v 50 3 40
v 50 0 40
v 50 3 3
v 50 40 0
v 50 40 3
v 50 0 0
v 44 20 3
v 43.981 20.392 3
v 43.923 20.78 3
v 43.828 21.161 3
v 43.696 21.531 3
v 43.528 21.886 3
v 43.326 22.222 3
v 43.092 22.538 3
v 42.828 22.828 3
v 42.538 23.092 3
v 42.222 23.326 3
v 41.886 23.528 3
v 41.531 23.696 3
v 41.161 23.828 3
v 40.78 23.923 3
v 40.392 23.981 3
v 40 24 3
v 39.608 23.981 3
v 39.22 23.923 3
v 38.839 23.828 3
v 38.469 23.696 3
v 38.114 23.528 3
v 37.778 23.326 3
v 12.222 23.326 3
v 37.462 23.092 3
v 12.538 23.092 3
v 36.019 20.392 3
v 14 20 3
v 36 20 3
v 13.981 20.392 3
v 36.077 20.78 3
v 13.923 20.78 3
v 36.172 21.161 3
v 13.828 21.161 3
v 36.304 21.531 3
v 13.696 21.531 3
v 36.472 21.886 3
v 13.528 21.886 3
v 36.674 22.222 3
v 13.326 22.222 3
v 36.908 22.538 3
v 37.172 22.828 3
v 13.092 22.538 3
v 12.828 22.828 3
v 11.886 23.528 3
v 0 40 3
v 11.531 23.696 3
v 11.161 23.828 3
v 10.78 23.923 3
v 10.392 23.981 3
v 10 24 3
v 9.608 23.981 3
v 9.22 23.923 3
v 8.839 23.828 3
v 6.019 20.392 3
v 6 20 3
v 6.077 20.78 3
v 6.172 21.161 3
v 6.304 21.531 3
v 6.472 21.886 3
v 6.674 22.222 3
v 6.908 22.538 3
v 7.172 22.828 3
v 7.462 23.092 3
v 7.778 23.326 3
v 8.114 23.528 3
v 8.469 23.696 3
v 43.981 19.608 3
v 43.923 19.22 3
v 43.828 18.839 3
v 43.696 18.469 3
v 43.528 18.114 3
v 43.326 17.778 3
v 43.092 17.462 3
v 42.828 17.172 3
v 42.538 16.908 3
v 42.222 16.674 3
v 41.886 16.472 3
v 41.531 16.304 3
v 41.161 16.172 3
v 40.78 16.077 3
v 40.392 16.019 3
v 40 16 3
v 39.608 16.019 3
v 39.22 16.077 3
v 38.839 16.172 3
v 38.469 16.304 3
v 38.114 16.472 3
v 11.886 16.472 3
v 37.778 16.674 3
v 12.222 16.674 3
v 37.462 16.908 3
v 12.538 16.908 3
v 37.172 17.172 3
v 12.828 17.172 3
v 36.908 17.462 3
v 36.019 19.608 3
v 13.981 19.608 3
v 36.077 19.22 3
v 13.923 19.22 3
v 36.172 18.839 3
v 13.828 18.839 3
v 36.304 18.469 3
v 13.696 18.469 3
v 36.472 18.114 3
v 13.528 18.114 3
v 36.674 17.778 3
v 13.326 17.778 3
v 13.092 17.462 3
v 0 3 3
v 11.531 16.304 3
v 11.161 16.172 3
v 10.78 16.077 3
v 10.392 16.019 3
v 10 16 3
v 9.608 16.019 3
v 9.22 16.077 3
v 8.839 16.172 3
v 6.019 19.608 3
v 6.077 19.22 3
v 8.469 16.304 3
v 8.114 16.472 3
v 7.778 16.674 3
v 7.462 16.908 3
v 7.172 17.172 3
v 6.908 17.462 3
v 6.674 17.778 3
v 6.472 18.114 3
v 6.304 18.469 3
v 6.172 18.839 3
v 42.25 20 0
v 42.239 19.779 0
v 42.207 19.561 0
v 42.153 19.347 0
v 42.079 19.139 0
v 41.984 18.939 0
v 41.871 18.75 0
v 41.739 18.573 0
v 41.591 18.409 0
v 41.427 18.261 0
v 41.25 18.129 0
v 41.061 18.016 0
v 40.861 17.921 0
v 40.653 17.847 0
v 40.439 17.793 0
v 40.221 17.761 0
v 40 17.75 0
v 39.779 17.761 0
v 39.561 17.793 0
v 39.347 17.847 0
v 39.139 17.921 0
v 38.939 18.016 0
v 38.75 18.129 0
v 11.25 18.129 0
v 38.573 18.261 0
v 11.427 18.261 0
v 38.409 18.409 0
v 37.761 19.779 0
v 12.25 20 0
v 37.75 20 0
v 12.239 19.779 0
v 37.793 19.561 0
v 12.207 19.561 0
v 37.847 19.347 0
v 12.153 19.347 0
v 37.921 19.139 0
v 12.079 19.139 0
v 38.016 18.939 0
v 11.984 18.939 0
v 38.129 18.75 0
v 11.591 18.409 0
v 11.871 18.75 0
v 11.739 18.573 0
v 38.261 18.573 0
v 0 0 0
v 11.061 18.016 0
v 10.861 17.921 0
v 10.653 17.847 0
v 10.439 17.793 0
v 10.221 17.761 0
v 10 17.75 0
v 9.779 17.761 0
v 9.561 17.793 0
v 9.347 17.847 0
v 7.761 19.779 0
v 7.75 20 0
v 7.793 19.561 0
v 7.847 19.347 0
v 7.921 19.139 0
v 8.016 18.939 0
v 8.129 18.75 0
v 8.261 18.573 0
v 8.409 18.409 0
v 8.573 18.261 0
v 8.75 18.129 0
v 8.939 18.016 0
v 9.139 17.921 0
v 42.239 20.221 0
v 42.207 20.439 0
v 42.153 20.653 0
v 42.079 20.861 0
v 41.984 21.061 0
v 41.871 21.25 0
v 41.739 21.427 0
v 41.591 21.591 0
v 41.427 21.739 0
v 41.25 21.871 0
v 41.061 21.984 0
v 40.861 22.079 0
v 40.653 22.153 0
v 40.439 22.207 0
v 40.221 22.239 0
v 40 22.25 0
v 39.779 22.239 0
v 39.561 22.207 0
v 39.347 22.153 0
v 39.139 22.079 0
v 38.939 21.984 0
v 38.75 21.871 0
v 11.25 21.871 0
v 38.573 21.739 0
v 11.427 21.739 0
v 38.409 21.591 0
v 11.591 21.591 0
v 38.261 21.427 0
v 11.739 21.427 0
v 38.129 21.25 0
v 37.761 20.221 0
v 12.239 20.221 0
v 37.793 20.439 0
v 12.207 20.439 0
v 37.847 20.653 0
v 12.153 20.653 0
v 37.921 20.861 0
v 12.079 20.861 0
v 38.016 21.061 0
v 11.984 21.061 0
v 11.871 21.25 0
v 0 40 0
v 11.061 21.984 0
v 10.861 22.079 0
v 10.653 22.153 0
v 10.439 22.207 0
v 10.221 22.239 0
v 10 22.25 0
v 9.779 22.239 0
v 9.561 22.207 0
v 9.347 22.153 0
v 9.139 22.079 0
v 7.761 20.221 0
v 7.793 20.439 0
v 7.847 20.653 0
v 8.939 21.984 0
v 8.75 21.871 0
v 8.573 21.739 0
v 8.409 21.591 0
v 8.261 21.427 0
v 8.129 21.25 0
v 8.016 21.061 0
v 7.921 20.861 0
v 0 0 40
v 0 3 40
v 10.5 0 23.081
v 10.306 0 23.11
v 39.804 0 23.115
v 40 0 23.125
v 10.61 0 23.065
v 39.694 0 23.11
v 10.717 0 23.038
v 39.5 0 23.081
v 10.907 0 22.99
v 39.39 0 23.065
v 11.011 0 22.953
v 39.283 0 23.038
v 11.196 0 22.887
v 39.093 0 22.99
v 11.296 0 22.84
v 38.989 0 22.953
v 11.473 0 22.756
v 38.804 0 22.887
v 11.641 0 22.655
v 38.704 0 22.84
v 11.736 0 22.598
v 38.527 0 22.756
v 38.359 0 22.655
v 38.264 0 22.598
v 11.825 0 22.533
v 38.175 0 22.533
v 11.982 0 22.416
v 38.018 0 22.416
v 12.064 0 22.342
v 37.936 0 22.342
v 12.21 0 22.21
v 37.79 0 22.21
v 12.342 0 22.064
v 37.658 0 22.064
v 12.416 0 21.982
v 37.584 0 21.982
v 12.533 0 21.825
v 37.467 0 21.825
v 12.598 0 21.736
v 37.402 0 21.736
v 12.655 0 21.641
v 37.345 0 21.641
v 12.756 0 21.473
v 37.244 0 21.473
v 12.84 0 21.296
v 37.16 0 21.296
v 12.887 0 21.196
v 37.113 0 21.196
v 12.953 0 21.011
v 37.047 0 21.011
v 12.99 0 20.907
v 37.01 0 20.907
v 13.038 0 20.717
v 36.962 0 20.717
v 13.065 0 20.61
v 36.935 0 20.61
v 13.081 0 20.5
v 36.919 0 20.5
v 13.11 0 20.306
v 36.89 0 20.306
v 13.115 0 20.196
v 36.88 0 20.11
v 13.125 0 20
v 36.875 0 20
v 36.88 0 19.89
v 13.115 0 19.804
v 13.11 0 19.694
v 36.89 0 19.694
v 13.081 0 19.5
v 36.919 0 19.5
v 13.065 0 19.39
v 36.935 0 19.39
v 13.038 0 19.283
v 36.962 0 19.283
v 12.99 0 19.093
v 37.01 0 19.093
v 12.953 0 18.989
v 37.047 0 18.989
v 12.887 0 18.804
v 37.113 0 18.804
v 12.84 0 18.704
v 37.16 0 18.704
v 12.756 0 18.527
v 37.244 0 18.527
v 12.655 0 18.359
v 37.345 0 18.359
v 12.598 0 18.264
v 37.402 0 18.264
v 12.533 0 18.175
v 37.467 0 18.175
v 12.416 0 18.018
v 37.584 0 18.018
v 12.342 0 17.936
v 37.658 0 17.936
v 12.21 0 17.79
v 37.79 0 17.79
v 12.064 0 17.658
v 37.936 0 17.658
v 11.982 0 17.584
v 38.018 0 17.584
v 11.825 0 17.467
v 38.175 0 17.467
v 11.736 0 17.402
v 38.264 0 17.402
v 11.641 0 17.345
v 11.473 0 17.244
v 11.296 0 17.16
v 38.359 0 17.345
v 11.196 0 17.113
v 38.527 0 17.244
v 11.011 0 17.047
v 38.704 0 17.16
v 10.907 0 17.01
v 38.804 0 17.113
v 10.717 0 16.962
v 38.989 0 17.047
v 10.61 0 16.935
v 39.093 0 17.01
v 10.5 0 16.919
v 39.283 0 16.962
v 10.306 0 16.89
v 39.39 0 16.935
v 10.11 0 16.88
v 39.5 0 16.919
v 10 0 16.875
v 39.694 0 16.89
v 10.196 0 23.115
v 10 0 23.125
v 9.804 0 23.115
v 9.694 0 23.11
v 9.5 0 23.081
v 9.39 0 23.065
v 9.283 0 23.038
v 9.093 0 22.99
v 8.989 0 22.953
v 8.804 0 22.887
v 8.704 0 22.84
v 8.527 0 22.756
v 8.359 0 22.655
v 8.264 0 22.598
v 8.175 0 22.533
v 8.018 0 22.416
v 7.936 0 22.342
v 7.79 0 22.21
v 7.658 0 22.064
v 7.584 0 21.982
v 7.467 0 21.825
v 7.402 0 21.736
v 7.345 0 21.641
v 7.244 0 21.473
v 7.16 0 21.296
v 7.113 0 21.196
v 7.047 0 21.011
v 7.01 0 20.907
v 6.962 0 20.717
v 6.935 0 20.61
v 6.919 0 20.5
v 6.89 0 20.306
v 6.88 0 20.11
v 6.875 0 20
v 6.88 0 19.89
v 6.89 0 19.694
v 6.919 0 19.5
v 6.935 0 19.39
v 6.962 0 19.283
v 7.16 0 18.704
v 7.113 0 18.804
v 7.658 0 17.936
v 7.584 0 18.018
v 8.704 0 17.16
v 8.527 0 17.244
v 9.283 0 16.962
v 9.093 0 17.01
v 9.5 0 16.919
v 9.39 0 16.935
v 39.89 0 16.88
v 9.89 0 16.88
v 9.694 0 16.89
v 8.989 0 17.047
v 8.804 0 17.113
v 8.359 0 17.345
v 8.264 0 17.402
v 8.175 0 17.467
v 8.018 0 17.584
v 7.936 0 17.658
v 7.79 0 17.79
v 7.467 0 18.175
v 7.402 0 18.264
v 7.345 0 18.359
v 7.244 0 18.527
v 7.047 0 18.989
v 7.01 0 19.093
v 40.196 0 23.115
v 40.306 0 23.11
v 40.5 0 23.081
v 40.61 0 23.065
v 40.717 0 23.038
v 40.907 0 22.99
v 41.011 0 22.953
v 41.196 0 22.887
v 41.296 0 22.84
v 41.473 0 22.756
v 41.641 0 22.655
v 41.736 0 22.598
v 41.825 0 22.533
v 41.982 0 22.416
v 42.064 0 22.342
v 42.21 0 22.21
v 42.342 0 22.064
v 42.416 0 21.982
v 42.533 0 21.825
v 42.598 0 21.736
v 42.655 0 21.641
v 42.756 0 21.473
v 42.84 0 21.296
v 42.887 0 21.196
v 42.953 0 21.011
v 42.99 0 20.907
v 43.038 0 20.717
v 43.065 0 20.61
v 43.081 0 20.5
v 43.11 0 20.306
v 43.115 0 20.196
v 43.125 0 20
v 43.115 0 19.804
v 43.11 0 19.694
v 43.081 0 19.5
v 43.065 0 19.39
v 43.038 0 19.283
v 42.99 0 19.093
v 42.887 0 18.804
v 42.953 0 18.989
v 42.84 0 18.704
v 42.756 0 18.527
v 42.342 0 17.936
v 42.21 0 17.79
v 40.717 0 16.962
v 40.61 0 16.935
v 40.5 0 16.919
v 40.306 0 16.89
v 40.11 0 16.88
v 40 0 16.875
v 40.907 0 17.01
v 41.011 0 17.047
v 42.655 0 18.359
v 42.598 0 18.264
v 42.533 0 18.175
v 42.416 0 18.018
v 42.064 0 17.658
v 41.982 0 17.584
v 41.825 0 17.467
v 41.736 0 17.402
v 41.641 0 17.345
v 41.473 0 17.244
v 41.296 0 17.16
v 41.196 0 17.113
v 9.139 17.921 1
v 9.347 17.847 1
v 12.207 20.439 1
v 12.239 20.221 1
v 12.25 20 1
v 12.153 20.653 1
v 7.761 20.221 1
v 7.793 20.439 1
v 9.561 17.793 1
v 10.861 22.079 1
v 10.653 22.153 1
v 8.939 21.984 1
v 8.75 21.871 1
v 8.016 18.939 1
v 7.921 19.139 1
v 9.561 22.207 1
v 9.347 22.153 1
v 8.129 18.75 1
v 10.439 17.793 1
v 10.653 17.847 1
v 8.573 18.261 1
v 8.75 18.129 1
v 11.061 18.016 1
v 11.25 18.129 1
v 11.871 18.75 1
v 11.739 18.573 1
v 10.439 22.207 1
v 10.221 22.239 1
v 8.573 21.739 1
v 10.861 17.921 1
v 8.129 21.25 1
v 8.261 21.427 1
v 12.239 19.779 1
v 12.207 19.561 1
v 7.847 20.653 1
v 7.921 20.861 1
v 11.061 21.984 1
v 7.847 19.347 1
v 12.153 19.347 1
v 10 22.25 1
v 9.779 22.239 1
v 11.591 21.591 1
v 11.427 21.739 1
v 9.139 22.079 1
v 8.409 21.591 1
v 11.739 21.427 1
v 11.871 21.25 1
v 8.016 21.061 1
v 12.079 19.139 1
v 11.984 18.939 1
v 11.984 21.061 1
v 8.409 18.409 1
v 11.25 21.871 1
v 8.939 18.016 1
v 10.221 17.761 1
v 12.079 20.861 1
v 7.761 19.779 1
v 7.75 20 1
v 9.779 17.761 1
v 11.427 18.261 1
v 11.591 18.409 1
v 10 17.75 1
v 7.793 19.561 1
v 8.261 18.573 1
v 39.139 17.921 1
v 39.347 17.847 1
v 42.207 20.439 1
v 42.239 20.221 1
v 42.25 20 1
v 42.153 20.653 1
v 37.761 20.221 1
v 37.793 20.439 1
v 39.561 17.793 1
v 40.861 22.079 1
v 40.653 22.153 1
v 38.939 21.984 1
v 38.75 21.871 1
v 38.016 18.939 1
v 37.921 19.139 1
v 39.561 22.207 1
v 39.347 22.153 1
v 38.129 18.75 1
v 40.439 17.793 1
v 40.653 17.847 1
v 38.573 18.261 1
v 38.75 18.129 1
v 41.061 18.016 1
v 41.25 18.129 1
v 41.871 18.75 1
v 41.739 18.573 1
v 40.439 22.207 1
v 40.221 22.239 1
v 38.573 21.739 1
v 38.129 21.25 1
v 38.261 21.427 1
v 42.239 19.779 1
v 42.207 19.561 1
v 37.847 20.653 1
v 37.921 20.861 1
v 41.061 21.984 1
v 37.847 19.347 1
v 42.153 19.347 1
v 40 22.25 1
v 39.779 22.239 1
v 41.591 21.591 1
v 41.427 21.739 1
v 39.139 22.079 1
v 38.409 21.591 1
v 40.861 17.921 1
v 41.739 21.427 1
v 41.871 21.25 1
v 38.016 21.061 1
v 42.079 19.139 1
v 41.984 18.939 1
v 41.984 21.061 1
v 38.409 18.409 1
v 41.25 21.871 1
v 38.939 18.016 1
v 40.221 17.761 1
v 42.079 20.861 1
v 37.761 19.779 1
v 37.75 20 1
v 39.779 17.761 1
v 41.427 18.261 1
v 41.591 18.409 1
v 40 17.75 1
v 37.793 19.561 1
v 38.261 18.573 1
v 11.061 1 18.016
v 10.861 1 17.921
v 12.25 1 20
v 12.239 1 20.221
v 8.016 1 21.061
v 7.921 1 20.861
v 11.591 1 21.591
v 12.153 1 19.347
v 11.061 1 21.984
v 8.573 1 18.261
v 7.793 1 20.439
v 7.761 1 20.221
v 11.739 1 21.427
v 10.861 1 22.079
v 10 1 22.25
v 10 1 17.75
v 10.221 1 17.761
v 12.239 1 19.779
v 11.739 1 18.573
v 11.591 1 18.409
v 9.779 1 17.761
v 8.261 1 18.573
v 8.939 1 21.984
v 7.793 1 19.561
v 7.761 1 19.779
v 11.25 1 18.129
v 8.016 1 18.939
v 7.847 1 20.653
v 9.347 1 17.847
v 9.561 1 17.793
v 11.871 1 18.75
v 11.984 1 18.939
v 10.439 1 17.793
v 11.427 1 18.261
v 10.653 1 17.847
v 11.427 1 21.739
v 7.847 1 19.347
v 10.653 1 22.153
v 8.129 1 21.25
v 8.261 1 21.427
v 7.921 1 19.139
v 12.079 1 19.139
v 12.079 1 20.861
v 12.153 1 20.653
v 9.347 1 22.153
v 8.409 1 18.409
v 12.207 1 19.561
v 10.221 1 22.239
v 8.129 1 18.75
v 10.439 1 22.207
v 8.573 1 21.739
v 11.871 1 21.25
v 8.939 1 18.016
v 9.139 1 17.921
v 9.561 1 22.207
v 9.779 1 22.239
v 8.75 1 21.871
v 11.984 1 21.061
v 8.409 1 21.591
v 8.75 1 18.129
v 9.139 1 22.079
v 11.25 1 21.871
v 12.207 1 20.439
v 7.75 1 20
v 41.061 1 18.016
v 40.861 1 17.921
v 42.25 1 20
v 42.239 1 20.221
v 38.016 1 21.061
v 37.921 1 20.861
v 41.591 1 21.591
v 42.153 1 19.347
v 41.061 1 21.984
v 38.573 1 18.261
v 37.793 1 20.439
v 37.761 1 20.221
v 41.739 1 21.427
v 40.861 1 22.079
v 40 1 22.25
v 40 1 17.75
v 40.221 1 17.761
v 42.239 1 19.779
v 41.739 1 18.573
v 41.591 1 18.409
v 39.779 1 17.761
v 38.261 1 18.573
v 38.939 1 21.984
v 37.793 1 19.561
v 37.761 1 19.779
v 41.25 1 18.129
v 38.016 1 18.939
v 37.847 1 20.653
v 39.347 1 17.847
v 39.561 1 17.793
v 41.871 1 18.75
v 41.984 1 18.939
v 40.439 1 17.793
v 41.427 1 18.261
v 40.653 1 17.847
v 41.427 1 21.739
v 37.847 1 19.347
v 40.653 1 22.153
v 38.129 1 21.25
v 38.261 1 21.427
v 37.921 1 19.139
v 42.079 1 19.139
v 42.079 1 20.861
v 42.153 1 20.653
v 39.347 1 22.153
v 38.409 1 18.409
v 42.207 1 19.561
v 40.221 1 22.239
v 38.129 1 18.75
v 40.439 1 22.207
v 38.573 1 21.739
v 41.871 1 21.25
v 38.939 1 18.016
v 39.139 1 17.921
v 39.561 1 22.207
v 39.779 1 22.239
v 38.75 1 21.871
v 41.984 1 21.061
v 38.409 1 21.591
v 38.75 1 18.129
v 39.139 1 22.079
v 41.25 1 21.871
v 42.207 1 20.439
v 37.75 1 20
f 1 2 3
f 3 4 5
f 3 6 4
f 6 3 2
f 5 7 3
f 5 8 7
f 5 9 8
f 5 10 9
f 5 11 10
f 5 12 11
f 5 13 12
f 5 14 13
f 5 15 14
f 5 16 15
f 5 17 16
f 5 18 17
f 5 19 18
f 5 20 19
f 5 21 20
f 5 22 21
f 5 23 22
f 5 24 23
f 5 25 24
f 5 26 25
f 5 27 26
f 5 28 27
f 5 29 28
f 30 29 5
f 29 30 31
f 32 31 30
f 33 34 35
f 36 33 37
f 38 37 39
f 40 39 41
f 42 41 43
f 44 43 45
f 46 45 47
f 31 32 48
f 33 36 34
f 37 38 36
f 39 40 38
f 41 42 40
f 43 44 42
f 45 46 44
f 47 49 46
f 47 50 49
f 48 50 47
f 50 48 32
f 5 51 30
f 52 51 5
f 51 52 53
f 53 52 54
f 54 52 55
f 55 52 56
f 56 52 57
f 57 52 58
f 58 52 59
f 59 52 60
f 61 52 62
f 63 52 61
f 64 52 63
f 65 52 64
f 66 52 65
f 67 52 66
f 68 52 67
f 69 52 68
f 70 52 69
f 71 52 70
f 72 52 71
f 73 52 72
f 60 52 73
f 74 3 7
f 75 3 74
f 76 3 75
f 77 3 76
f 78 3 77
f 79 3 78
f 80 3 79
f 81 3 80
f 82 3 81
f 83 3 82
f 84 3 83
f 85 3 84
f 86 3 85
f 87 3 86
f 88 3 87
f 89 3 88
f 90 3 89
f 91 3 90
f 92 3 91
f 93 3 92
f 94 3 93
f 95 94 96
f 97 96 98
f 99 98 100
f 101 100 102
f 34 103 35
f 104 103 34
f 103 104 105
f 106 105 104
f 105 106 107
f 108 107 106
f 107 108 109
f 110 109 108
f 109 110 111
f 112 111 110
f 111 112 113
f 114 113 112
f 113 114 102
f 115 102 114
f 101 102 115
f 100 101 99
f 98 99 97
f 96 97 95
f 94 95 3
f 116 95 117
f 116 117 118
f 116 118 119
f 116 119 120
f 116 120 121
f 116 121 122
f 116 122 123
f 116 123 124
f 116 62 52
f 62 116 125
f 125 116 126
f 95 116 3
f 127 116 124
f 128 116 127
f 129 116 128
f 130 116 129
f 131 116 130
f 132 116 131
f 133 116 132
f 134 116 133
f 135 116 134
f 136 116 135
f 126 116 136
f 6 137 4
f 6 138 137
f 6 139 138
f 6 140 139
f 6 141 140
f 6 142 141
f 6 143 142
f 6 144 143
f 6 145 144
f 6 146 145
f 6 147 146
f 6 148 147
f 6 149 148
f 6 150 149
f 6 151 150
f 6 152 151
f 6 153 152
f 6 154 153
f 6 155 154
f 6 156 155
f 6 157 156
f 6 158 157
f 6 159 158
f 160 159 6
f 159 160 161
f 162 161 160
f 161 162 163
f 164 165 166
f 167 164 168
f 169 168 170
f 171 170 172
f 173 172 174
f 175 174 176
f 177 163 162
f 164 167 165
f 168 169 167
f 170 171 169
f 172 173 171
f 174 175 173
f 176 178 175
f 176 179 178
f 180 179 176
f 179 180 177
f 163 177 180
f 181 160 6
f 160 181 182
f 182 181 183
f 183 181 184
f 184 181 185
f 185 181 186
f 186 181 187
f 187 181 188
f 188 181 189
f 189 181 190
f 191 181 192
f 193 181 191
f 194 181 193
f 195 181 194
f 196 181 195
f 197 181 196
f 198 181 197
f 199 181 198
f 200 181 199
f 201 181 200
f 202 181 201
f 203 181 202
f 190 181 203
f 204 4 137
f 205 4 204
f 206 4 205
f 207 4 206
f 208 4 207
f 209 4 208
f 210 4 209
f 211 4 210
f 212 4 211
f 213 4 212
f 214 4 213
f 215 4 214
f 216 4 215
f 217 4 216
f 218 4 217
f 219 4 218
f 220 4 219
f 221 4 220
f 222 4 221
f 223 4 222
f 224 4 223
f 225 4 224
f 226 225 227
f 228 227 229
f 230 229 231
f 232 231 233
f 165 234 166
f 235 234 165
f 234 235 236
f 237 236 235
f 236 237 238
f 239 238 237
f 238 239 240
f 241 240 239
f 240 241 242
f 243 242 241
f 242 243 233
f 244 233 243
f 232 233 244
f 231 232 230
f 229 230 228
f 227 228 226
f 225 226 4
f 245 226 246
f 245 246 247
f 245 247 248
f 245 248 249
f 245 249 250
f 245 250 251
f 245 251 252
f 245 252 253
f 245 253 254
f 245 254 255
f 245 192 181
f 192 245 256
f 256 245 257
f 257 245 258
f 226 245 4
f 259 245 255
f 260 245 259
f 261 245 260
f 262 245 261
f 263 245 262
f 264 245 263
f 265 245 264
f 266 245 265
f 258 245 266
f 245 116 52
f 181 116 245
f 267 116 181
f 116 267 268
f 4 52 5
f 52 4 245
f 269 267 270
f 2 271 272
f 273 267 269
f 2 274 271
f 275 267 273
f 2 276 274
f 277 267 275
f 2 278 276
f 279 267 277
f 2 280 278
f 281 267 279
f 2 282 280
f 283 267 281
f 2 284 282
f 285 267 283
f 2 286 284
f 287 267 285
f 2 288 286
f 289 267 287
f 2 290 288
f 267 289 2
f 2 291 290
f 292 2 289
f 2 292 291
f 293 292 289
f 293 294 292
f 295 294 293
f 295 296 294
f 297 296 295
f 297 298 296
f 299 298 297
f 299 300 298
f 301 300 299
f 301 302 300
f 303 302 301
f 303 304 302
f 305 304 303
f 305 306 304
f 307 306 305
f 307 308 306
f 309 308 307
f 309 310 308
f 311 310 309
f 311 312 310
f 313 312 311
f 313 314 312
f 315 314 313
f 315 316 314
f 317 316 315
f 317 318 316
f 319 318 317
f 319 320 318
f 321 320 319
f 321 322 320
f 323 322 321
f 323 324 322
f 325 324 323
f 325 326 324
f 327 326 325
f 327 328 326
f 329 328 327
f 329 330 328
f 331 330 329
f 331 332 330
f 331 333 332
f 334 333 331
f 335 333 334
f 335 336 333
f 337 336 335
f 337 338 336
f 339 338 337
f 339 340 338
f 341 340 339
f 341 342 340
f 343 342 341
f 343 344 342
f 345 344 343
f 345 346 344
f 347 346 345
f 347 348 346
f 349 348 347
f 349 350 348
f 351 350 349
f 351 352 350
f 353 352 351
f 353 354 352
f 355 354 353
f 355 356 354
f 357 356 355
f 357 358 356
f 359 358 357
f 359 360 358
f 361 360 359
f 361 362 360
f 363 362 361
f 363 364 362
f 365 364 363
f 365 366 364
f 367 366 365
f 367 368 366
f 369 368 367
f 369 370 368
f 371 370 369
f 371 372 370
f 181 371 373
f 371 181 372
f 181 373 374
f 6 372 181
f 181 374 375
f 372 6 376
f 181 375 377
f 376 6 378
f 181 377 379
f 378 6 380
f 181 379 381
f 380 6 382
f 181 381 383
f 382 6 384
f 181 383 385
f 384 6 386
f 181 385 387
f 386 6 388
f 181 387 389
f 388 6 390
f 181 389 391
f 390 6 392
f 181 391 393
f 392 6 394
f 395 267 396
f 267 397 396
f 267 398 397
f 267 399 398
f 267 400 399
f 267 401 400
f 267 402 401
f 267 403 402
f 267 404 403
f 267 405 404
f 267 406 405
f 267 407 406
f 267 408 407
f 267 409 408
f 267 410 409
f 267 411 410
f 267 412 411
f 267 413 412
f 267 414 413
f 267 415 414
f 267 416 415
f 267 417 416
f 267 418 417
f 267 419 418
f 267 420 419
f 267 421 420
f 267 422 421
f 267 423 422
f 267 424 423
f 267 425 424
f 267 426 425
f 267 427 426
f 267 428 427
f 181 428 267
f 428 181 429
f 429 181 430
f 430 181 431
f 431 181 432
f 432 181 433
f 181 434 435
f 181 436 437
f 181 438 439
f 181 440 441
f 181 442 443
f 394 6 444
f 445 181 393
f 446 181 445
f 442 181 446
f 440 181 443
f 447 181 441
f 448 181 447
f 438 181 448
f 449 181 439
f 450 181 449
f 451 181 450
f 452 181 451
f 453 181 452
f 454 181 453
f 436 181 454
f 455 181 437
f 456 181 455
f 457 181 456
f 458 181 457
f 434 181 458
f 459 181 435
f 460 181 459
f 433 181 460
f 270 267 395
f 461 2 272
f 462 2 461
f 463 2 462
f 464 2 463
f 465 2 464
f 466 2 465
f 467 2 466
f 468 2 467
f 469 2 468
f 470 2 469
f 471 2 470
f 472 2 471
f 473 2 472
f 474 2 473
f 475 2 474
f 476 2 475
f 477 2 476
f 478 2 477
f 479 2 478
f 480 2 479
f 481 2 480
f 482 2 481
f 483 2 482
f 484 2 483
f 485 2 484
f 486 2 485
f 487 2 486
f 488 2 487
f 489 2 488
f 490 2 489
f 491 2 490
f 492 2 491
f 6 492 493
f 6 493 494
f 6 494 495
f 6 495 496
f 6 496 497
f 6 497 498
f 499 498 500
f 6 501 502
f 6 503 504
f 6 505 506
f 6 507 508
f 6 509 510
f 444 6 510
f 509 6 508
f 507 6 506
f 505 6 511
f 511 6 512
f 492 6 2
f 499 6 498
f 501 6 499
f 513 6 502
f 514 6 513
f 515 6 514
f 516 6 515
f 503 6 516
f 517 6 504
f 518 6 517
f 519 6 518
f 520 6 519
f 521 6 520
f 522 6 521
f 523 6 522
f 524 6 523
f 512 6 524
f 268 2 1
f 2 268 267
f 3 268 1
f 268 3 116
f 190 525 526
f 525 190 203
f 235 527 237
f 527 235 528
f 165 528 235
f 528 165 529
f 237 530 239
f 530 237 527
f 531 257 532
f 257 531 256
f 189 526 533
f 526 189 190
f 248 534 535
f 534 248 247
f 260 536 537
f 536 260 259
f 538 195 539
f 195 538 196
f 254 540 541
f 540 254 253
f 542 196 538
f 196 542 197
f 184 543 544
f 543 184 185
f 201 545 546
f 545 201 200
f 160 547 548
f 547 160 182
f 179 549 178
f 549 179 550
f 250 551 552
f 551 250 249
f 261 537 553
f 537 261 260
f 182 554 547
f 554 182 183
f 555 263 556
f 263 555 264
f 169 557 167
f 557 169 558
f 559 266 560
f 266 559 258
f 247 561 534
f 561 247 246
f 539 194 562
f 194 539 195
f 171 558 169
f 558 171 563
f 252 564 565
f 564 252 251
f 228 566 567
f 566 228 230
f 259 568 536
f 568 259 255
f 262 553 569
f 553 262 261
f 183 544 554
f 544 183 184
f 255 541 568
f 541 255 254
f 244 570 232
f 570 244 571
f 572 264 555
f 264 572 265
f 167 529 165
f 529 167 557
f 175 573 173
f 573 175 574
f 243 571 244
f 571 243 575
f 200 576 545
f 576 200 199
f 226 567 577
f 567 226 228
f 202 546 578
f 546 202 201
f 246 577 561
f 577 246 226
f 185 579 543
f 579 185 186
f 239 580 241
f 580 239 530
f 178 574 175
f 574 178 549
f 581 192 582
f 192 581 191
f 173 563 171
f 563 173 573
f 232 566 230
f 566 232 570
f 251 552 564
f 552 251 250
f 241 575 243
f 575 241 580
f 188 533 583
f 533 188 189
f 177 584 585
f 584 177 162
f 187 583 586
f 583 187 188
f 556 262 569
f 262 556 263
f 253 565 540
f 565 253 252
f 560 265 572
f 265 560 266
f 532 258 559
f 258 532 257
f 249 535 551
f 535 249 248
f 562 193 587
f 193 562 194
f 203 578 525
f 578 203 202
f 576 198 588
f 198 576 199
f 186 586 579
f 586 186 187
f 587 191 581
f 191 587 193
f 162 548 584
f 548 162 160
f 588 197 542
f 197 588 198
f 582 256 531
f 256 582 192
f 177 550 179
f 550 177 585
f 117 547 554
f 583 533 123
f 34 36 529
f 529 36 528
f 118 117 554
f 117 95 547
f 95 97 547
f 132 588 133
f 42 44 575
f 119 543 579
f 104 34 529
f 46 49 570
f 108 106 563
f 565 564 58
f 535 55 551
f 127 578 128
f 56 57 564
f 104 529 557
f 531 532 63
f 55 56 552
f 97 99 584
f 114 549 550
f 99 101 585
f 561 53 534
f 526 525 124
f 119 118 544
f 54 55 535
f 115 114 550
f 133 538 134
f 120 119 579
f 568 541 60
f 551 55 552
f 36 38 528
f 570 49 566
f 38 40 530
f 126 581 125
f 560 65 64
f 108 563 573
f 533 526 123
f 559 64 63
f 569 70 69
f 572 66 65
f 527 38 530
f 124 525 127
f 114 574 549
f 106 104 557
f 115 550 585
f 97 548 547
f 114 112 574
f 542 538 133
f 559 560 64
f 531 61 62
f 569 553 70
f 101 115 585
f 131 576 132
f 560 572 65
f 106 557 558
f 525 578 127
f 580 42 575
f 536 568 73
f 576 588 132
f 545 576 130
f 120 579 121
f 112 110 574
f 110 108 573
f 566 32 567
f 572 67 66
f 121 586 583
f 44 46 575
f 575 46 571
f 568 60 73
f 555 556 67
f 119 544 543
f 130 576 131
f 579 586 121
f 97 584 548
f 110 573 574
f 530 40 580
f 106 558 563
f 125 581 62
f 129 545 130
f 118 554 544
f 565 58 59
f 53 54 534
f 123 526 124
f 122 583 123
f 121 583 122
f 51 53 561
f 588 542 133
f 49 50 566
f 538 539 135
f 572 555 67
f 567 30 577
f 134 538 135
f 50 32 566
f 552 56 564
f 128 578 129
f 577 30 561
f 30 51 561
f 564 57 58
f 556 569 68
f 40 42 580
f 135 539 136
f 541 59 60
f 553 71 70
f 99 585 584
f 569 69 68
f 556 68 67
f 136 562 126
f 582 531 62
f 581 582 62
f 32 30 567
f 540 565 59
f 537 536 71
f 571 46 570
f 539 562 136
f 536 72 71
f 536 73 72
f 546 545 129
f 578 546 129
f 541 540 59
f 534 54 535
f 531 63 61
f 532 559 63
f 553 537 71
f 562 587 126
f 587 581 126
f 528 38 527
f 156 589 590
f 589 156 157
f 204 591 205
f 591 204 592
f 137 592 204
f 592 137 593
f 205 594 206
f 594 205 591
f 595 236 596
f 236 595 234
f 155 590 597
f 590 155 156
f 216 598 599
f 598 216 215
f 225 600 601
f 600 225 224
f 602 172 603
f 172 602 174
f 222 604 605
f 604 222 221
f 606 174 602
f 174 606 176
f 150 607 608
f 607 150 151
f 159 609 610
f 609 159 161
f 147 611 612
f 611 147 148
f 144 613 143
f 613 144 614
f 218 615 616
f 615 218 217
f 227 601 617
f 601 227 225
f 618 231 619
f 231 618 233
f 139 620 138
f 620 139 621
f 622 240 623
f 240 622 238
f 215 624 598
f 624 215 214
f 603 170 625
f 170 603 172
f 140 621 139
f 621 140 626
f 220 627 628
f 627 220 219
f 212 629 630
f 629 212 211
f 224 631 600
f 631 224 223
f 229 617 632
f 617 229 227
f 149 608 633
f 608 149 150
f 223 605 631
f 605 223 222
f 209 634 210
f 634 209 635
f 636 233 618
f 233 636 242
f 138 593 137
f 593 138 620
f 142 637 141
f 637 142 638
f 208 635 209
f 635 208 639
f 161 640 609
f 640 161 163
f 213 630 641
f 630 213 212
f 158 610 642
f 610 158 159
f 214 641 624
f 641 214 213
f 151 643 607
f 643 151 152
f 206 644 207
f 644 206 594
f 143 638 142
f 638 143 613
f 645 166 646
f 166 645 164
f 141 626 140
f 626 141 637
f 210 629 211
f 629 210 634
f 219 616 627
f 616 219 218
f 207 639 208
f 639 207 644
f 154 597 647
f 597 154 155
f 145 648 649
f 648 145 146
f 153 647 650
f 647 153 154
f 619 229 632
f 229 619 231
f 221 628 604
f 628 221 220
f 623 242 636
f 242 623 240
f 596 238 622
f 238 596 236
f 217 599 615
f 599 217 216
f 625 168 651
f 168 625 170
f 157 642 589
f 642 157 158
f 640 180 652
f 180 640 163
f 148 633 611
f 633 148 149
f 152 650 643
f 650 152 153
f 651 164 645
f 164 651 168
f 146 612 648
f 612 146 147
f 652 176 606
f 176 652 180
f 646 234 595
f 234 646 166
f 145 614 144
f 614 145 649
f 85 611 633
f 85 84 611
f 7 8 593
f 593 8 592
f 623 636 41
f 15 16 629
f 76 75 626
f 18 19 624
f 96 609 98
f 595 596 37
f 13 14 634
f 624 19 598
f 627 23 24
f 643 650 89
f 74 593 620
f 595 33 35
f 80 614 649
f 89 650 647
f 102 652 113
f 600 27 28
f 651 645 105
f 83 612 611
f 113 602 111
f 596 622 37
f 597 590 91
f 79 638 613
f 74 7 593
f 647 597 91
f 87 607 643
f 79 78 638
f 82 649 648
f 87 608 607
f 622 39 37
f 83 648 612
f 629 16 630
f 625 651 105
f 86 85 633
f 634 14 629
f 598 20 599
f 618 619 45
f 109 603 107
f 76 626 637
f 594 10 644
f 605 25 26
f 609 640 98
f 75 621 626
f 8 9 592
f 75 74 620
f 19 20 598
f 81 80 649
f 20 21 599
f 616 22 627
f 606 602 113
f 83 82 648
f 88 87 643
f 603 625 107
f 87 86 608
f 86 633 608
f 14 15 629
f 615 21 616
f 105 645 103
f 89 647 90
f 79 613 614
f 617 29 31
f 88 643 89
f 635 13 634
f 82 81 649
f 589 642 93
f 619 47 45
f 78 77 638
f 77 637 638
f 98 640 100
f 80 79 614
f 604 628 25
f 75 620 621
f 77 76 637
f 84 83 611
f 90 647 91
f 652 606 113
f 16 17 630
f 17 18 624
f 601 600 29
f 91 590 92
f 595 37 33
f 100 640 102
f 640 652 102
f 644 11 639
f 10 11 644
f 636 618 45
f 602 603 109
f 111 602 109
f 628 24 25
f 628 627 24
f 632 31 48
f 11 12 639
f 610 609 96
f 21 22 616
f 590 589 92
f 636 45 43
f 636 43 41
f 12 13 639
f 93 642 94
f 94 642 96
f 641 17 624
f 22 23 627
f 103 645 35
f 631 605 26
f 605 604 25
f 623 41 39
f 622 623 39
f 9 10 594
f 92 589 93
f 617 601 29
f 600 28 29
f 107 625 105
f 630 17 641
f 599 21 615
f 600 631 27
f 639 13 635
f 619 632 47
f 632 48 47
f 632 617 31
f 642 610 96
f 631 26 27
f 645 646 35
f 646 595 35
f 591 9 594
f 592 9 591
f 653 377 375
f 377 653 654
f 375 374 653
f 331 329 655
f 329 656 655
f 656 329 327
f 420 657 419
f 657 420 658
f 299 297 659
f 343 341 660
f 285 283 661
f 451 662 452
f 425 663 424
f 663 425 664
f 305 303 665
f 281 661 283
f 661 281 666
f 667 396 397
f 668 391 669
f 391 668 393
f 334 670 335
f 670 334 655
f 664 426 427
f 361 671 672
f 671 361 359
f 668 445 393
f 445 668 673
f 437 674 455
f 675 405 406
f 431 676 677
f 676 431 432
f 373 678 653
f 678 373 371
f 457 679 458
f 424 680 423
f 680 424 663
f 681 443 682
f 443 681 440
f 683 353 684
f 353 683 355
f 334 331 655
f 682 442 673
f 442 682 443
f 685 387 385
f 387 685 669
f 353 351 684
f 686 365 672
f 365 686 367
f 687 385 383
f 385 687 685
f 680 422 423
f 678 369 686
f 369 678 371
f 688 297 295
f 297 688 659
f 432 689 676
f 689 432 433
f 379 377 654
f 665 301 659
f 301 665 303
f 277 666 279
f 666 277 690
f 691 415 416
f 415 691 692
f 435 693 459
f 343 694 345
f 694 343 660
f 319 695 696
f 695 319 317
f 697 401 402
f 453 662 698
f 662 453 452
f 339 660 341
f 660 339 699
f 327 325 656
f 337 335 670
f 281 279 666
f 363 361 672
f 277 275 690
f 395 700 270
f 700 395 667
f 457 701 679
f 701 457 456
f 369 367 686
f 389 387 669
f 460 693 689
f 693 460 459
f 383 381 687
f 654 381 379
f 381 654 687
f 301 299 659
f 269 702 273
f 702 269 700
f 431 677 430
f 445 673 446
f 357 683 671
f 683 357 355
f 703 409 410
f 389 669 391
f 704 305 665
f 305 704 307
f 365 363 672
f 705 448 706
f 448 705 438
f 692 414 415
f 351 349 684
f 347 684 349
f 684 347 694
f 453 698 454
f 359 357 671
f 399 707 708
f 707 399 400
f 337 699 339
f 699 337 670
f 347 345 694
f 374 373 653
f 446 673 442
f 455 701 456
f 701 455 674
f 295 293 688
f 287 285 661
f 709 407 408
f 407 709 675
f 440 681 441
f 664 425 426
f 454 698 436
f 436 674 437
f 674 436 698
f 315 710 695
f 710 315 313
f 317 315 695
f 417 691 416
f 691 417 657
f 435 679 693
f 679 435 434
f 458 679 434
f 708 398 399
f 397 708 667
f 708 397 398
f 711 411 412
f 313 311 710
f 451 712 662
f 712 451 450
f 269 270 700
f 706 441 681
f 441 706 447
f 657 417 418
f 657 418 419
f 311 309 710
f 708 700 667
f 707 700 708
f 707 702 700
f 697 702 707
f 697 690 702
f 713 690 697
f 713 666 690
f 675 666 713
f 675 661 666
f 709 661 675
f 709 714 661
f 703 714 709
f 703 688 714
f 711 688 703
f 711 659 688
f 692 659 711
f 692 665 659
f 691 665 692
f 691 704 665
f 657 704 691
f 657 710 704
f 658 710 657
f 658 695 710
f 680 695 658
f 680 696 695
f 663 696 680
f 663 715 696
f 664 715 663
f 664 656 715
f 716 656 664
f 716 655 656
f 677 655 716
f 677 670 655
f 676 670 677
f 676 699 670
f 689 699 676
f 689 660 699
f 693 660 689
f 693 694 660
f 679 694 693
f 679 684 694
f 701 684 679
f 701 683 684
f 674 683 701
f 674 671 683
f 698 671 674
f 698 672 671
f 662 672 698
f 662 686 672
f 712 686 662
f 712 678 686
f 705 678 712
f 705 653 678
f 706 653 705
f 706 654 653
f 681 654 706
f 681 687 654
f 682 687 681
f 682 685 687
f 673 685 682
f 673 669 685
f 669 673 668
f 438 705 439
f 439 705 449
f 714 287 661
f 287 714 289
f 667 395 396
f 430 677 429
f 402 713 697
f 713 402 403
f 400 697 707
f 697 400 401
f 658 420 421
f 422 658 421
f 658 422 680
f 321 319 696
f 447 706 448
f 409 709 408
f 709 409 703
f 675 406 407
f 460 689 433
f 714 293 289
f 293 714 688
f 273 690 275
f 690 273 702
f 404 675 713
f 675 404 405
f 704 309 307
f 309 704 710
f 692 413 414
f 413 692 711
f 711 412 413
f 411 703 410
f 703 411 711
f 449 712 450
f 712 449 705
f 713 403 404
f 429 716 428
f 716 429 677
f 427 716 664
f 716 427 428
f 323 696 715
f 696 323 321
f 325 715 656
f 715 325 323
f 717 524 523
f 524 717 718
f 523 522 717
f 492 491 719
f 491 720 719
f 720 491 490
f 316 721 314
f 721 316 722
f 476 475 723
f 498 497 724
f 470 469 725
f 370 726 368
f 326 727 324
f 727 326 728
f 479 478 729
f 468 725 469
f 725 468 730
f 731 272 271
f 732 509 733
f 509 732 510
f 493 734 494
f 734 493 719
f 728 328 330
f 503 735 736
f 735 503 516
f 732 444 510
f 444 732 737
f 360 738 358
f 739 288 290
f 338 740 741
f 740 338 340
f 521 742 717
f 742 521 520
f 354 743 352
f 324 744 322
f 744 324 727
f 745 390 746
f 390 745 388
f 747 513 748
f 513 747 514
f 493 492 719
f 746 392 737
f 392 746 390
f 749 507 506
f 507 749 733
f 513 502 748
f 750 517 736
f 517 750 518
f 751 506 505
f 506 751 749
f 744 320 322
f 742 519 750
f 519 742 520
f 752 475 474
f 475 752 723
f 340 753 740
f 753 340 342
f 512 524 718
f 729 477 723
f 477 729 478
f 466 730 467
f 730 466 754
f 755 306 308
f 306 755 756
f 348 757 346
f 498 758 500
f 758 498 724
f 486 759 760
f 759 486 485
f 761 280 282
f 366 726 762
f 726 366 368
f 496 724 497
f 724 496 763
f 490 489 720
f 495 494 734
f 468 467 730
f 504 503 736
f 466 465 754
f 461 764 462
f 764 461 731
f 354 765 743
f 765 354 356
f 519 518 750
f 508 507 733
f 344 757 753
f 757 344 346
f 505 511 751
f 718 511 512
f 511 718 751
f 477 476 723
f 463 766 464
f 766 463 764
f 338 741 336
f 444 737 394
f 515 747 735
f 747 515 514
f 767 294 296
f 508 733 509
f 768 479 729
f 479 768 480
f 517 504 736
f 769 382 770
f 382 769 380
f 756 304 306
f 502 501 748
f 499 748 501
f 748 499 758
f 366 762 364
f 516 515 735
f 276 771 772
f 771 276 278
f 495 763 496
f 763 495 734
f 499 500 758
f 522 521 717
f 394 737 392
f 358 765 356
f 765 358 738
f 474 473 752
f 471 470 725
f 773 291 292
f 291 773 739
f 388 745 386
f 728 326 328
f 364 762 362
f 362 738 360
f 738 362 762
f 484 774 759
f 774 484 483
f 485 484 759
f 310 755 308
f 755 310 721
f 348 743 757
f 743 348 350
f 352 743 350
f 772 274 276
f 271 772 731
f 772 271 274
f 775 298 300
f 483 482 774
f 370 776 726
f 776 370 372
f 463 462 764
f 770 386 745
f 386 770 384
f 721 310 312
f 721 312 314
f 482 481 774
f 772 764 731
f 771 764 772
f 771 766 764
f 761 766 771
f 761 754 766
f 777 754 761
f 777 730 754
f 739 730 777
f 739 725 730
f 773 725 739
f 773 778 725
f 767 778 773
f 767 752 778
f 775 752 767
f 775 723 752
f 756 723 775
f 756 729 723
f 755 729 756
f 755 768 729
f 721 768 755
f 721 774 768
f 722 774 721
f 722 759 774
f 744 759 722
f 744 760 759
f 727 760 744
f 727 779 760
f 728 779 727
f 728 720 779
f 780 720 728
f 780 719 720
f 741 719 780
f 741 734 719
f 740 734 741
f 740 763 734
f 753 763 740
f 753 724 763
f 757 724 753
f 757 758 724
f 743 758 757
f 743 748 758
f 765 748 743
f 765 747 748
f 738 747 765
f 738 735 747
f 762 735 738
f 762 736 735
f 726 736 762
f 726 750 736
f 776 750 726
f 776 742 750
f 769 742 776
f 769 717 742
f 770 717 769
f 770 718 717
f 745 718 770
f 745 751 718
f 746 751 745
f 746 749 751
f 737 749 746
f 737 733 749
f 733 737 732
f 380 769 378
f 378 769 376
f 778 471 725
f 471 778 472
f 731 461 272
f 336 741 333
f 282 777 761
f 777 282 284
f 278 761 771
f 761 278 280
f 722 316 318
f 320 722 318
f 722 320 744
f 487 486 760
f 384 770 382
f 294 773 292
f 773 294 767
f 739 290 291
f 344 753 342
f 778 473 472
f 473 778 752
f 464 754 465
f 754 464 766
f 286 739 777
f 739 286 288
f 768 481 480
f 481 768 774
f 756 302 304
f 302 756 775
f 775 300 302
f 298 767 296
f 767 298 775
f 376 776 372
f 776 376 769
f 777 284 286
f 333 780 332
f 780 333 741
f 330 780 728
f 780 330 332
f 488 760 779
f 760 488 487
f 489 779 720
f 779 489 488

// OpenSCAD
$fn = 64;

width = 50;
depth = 40;
height = 40;
thickness = 3;

hole_d = 4.5;
csk_d = 8;
csk_depth = 2;

difference() {
    union() {
        // Horizontal flange
        cube([width, depth, thickness]);
        // Vertical flange
        cube([width, thickness, height]);
    }

    // Holes on horizontal flange (countersink on top)
    for (x = [10, width-10]) {
        translate([x, depth/2, 0])
            cylinder(h = thickness, d = hole_d);
        translate([x, depth/2, thickness - csk_depth])
            cylinder(h = csk_depth, d1 = hole_d, d2 = csk_d);
    }

    // Holes on vertical flange (countersink on outer side)
    for (x = [10, width-10]) {
        translate([x, 0, height/2])
            rotate([90, 0, 0])
                cylinder(h = thickness, d = hole_d);
        translate([x, thickness - csk_depth, height/2])
            rotate([90, 0, 0])
                cylinder(h = csk_depth, d1 = hole_d, d2 = csk_d);
    }
}
